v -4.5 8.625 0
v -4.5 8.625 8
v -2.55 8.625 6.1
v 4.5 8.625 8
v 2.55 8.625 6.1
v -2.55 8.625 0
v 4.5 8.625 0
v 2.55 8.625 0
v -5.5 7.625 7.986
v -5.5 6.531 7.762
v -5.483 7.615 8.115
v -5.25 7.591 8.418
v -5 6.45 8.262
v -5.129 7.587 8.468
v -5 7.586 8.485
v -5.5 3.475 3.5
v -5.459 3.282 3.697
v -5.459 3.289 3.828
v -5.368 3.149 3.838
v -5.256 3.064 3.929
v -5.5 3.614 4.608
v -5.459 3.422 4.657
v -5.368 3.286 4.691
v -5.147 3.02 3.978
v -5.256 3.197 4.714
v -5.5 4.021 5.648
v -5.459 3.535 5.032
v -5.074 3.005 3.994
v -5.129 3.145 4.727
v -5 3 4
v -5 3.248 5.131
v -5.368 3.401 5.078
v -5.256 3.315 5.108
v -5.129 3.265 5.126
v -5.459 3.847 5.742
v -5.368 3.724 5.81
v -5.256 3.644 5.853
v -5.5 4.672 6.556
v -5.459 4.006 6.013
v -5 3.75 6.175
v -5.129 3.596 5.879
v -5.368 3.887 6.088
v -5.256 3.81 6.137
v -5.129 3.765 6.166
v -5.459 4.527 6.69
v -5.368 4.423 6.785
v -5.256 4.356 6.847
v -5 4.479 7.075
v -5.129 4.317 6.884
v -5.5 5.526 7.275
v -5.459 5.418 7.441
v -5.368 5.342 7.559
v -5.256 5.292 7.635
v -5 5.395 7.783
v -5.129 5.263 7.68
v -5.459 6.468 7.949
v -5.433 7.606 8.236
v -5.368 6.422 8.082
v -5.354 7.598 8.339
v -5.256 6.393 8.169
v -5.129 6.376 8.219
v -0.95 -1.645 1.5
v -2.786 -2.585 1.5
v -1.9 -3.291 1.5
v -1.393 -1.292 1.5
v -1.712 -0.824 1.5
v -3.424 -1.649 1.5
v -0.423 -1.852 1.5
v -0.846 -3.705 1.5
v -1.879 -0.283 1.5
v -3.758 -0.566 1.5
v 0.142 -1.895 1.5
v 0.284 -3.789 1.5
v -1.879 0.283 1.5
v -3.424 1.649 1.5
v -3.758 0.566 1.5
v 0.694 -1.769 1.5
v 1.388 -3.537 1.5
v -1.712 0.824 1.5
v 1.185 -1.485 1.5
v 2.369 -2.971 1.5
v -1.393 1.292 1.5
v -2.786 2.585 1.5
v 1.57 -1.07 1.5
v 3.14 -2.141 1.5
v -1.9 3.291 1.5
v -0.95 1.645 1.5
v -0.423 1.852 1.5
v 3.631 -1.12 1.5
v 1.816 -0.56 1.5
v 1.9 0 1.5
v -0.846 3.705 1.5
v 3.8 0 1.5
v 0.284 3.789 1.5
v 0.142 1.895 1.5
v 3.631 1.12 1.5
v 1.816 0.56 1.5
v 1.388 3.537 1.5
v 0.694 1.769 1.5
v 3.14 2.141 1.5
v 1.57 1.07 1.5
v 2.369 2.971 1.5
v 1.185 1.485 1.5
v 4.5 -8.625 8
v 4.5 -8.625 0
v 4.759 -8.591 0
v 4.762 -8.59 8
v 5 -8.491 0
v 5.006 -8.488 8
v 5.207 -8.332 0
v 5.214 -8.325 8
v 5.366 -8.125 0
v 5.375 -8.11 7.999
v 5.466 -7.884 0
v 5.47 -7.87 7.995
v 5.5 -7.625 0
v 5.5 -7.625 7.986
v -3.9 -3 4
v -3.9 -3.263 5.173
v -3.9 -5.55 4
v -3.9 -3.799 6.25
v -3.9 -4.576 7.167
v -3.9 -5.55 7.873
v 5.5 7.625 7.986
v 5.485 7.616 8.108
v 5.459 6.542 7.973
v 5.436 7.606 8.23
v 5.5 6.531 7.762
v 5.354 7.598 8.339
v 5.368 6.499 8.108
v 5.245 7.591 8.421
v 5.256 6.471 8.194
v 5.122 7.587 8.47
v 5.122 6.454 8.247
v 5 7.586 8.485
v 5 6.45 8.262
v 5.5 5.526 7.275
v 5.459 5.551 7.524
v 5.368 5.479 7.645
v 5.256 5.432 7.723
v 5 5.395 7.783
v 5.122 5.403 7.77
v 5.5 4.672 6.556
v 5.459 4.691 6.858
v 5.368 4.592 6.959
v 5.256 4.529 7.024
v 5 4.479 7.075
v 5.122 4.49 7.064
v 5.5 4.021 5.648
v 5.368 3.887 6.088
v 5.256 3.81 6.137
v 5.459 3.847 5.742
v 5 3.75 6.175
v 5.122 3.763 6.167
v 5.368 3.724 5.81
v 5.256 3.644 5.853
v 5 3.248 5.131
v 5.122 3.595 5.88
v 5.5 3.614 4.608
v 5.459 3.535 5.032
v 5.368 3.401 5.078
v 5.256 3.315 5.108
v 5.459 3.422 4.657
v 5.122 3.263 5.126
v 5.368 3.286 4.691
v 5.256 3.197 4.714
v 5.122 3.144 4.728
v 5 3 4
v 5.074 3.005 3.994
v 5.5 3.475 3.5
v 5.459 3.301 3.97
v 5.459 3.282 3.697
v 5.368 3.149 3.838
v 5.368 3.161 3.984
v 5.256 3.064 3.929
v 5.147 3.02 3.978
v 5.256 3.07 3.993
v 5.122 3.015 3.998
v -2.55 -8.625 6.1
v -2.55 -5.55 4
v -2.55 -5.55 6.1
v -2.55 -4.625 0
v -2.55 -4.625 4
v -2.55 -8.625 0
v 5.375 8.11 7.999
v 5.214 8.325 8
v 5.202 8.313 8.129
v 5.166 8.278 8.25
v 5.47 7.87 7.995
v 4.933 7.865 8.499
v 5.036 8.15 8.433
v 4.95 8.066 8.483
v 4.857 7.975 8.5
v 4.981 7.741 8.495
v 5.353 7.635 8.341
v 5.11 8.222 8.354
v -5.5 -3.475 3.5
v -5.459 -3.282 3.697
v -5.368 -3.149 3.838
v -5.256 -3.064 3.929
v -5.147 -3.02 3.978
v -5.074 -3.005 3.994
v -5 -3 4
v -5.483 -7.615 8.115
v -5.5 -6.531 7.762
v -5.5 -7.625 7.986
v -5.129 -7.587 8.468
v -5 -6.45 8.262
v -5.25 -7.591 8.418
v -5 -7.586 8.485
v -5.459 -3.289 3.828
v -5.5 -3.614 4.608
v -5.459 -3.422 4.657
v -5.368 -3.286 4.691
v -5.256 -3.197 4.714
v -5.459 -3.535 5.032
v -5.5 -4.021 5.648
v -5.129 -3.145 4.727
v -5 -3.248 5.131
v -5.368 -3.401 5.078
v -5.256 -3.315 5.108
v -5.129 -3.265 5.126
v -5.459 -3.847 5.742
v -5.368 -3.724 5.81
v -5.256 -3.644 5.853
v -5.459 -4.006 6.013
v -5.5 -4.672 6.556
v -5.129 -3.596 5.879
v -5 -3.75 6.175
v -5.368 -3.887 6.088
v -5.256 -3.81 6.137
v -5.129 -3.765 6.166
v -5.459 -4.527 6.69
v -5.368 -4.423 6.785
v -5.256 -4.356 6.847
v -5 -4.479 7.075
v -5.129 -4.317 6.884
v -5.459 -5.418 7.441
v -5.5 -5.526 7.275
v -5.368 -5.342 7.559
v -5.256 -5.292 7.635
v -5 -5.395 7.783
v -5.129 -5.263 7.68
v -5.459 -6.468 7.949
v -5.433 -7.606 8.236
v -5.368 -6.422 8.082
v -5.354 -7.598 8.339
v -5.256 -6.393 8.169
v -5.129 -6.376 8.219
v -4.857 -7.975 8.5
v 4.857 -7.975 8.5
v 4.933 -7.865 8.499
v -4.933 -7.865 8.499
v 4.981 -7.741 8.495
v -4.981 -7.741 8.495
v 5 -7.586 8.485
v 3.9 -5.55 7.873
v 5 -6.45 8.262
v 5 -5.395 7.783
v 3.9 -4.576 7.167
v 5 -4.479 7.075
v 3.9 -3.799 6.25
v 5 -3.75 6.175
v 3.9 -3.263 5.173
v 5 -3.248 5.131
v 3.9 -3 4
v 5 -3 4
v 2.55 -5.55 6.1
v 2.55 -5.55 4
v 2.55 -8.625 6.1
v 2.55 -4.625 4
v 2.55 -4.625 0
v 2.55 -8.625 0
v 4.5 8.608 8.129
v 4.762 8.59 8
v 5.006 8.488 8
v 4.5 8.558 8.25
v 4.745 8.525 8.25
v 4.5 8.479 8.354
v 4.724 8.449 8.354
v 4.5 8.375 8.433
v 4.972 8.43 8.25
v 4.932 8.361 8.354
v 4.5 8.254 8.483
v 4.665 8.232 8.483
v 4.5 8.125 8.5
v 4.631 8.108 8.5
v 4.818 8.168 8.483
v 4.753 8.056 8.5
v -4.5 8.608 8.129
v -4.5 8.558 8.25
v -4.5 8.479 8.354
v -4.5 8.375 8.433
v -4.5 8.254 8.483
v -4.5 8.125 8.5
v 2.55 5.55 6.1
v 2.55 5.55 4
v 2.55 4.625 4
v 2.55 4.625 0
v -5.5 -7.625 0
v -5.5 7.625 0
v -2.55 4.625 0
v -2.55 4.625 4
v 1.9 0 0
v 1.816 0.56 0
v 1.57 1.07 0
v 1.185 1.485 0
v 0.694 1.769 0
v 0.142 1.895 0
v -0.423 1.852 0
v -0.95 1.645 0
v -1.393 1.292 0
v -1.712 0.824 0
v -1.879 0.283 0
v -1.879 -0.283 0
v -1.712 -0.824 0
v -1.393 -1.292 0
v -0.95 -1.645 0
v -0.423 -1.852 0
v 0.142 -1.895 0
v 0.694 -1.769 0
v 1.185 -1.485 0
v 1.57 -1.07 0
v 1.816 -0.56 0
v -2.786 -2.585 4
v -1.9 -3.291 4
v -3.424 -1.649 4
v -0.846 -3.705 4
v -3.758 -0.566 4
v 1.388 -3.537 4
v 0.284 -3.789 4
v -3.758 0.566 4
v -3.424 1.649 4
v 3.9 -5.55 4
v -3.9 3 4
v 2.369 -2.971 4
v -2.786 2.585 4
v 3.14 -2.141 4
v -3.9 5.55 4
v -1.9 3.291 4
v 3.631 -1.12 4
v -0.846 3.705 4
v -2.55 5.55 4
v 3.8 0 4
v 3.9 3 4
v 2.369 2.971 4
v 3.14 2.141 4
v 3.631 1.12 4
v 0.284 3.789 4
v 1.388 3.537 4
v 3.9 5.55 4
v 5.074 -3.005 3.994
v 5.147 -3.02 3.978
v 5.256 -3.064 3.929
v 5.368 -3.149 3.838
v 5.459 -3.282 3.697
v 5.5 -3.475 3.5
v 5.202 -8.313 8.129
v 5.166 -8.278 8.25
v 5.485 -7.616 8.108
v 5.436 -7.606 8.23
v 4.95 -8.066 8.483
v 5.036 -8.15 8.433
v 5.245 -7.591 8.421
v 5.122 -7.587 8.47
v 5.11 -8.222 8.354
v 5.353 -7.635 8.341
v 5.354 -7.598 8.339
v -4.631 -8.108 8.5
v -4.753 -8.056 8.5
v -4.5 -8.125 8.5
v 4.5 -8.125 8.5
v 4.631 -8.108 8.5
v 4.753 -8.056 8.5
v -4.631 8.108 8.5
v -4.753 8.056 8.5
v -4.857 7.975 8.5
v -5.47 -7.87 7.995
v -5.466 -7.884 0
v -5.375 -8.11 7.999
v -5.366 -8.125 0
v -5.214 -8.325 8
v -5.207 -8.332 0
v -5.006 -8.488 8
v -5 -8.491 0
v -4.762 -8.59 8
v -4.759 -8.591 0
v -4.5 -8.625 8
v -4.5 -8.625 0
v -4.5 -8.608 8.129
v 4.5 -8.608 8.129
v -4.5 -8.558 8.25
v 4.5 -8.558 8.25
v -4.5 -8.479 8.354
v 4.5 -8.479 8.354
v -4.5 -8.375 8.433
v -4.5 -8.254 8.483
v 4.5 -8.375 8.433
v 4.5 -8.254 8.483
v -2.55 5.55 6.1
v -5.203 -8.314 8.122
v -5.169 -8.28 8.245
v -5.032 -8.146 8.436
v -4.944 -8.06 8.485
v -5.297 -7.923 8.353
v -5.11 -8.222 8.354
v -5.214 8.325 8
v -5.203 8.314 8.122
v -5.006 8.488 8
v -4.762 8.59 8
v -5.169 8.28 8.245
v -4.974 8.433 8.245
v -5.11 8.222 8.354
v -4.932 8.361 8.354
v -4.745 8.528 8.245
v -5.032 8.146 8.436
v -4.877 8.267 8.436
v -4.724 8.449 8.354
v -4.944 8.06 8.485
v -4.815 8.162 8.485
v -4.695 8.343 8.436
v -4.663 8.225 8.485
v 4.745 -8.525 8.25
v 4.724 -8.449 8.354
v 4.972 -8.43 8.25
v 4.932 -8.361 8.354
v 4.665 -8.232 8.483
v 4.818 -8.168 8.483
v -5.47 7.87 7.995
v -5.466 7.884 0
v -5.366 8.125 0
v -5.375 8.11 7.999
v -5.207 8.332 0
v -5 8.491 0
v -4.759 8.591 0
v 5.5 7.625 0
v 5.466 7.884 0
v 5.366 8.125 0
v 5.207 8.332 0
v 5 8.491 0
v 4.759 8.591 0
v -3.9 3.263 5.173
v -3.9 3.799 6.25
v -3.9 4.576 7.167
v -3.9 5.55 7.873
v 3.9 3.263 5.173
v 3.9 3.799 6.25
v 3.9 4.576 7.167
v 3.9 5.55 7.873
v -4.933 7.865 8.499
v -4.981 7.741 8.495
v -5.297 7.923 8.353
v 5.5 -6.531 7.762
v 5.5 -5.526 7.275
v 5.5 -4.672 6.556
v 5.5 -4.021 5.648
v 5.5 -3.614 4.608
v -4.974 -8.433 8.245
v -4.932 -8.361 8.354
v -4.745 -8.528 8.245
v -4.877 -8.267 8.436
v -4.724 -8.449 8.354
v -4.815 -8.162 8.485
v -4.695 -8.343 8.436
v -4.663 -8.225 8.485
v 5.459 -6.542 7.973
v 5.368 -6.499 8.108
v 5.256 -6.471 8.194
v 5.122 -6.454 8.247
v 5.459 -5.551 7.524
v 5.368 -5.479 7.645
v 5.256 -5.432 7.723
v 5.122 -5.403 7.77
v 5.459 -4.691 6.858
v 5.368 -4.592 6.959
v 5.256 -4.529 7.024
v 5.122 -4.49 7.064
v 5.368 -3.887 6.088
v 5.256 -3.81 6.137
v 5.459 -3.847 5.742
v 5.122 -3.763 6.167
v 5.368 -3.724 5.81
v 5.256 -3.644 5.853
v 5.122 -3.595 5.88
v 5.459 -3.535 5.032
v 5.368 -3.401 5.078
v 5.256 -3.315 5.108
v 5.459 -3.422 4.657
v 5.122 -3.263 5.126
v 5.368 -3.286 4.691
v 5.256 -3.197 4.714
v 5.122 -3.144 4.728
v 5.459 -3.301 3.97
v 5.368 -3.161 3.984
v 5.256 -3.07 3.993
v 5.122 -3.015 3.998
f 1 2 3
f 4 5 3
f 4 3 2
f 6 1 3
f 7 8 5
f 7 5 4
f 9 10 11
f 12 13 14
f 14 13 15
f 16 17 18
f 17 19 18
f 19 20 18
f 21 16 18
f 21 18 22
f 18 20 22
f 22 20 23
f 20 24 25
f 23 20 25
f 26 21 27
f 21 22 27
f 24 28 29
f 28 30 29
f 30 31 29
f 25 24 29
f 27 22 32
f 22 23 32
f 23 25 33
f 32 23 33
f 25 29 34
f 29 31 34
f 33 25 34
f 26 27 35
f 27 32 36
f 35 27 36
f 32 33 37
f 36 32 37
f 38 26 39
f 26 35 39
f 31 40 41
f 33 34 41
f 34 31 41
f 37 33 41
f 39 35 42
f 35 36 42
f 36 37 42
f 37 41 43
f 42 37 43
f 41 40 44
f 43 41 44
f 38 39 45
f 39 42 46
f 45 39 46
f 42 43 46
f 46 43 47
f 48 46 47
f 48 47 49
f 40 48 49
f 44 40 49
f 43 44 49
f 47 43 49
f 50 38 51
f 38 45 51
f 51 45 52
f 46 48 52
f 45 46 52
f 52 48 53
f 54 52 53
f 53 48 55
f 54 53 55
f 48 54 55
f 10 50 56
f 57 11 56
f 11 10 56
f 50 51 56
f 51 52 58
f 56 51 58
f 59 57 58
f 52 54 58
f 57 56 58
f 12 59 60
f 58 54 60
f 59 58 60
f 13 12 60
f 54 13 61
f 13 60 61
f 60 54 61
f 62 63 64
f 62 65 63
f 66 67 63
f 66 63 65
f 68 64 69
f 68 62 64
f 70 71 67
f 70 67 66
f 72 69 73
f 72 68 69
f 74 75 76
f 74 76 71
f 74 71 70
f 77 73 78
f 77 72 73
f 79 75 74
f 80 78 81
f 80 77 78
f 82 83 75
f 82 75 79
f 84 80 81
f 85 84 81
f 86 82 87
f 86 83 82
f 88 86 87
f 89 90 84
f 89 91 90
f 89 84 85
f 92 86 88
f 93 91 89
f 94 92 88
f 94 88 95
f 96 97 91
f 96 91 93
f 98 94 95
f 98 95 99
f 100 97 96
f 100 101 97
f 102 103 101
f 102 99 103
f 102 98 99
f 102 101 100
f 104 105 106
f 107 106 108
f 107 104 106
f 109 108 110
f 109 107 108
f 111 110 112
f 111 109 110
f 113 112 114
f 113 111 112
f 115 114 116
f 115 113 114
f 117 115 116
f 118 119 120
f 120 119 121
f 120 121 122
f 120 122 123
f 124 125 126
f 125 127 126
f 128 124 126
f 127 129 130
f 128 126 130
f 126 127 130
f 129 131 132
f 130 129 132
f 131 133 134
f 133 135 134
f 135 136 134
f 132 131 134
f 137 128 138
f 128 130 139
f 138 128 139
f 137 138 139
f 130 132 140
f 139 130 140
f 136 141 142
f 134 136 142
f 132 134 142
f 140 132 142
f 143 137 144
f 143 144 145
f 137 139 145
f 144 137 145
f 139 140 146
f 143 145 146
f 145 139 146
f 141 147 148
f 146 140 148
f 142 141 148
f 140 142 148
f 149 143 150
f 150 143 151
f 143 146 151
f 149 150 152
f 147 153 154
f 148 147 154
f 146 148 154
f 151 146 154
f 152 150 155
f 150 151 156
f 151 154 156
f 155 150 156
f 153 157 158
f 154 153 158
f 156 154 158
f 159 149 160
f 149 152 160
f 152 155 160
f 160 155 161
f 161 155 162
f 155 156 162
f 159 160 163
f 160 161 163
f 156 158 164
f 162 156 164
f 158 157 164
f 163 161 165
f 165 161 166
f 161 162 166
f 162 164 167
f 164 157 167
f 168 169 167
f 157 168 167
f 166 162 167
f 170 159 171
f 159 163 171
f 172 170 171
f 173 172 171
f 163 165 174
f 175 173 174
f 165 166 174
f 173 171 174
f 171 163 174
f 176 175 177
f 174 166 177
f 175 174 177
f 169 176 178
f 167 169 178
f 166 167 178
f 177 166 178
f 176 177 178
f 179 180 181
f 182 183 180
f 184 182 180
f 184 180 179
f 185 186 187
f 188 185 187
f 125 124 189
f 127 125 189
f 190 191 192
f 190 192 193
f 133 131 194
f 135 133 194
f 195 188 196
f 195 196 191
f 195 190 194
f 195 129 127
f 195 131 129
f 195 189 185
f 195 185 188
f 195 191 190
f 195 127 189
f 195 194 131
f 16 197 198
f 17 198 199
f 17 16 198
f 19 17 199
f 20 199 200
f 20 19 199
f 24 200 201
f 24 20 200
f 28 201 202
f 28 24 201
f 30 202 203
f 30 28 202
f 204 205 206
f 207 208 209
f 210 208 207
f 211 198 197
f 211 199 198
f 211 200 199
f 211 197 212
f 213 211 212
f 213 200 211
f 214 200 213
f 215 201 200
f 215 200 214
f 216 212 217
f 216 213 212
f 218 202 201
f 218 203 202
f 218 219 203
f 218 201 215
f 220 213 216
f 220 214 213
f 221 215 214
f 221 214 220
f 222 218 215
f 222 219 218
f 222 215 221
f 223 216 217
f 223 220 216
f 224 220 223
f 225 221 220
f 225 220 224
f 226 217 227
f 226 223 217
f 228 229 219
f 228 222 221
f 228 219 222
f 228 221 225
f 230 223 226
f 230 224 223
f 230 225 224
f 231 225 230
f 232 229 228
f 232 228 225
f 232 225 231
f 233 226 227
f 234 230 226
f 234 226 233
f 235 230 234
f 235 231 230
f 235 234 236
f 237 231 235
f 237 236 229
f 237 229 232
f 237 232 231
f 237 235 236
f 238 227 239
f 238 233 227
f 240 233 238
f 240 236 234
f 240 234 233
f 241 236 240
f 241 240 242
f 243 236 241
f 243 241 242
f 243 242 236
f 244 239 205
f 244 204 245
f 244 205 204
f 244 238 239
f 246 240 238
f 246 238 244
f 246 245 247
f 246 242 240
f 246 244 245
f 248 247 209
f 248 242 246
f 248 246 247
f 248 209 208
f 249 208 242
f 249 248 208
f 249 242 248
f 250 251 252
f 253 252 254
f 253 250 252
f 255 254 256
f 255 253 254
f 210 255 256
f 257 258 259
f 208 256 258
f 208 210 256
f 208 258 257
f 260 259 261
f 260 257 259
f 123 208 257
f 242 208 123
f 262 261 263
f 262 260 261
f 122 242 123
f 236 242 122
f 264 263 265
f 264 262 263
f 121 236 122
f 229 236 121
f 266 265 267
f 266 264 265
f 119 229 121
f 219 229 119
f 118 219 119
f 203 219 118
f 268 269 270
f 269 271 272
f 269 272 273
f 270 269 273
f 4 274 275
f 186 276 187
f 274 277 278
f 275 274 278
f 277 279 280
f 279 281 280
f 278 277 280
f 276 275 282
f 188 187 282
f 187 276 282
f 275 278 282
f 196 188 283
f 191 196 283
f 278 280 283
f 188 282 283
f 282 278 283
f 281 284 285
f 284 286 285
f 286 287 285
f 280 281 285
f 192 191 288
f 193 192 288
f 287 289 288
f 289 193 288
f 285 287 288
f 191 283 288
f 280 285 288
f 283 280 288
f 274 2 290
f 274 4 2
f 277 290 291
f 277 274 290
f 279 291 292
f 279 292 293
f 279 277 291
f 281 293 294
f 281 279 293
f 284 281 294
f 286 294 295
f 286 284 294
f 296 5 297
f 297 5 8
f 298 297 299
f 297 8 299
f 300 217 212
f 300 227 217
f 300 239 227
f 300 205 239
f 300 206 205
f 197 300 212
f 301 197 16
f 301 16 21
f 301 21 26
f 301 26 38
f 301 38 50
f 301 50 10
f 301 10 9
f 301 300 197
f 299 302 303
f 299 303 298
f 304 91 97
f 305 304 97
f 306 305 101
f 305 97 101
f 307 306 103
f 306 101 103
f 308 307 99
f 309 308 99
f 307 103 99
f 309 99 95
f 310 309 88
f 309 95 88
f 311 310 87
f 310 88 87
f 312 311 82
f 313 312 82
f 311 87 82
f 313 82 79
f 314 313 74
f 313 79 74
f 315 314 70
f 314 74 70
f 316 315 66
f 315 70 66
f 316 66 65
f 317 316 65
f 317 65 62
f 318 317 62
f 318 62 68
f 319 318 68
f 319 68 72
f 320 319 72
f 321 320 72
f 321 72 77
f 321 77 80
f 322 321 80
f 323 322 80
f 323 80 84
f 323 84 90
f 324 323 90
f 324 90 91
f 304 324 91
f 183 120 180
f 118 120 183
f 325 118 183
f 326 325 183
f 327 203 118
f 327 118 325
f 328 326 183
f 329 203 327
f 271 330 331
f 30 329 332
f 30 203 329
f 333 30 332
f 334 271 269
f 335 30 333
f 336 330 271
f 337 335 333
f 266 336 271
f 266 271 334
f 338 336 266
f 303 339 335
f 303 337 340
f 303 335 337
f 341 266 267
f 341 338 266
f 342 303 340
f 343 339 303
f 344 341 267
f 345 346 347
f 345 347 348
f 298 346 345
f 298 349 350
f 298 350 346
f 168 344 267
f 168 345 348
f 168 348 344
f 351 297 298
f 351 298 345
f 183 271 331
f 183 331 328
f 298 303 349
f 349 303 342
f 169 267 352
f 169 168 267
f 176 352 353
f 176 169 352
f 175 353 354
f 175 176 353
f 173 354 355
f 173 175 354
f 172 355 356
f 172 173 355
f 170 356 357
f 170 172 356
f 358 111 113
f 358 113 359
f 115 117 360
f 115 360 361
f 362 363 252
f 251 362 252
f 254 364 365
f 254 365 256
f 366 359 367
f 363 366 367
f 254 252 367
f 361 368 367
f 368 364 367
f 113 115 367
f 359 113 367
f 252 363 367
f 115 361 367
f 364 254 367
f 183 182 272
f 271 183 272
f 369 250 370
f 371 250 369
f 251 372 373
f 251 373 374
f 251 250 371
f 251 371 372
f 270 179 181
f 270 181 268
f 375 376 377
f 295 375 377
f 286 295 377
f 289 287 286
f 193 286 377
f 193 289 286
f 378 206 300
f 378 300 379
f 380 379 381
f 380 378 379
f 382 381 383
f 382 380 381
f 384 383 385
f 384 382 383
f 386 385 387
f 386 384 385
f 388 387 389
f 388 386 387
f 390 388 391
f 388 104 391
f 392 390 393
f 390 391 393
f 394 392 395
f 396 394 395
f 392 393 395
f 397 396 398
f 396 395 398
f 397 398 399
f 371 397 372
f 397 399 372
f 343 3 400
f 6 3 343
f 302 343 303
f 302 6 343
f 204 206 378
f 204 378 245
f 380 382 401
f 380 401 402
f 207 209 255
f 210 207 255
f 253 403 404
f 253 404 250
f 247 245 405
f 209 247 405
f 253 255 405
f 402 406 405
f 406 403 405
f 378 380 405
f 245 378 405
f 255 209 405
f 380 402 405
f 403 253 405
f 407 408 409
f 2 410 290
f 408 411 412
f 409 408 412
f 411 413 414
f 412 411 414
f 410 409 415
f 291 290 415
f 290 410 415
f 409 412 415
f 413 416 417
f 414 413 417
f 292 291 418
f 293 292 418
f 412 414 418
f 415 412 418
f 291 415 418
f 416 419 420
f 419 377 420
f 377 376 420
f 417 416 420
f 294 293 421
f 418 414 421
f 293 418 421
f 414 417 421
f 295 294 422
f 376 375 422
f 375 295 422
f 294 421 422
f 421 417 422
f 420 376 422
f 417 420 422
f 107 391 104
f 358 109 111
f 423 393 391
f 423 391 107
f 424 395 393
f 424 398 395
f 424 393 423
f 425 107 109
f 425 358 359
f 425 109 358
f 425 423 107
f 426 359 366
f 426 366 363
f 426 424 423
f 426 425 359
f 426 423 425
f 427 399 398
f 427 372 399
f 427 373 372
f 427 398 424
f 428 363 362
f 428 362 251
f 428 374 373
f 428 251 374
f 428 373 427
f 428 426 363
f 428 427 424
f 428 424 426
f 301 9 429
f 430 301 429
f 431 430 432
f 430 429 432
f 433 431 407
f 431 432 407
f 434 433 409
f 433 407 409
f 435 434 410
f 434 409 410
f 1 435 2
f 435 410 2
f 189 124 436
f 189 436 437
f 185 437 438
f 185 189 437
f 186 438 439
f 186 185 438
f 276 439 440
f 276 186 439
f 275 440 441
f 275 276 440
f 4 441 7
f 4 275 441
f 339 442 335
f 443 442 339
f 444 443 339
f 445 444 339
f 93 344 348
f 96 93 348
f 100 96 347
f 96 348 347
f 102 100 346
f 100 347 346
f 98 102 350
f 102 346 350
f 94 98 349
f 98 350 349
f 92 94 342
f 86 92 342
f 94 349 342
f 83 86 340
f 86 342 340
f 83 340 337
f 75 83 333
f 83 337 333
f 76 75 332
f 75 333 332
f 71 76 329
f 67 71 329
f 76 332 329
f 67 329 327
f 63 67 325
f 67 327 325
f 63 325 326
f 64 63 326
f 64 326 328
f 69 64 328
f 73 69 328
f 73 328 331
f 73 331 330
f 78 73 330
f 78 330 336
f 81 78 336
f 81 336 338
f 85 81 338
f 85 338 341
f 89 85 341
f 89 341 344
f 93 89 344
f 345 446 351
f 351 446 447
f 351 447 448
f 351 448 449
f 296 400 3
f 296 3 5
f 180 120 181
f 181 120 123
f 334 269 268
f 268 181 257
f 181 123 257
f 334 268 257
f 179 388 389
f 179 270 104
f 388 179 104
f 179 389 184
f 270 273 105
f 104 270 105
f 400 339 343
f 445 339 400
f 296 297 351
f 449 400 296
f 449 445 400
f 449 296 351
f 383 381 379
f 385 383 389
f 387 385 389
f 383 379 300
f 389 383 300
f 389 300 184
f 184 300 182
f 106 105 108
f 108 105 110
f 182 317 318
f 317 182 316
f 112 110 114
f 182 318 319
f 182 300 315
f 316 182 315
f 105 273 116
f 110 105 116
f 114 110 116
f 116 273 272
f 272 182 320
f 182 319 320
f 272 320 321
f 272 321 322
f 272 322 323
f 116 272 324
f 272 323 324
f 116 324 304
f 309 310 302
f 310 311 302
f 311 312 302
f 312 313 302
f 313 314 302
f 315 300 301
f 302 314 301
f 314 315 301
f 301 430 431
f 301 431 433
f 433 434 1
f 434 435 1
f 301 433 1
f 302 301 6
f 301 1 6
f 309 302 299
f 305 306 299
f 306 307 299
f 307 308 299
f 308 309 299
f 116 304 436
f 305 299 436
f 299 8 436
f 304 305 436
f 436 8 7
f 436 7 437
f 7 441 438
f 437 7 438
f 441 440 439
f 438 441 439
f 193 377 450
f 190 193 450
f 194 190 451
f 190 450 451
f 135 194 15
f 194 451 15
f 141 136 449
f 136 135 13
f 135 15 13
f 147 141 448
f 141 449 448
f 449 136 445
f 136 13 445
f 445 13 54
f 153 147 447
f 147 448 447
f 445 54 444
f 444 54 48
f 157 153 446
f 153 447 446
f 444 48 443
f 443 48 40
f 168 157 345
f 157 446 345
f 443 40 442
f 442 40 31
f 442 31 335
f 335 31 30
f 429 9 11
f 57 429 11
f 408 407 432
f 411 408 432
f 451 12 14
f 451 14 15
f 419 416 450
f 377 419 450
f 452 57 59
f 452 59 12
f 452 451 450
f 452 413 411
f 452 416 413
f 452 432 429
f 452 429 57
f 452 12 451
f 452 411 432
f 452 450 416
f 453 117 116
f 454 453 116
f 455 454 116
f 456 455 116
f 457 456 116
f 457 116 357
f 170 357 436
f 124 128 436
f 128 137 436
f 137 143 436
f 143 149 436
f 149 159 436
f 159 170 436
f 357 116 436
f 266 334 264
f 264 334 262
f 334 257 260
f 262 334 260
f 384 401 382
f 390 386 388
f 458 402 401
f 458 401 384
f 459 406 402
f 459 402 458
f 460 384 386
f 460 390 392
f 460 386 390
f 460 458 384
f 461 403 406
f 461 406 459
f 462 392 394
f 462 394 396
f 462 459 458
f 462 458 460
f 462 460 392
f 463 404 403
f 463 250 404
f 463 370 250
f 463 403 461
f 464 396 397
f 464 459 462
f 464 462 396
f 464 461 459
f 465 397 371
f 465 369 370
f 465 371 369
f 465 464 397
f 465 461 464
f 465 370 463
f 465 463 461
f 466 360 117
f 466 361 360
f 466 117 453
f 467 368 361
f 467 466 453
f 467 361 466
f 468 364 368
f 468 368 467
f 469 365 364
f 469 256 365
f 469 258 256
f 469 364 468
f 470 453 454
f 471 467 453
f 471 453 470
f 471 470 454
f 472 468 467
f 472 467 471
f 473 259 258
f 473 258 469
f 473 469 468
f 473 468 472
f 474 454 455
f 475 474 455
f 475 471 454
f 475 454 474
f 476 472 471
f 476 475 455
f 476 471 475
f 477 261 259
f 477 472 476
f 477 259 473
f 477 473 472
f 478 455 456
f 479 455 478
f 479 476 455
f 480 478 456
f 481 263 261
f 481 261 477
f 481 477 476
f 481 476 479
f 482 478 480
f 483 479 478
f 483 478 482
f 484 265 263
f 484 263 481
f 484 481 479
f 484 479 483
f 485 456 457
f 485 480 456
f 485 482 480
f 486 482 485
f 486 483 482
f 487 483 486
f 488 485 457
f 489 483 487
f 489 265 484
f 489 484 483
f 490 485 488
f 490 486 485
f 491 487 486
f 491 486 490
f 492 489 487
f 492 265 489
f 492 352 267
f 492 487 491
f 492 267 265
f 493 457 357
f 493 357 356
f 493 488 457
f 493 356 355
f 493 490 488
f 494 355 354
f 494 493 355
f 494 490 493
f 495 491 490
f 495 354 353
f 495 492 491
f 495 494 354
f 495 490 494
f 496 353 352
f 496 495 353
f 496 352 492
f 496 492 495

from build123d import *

# Parameters (mm, degrees)
F0_W         = 11
F0_H         = 17.25
F1_DEPTH     = 8.5
F2_W         = 7.8
F2_H         = 2.55
F2_H_2       = 6
F2_W_2       = 1.6
F3_DEPTH     = 4.5
F4_W         = 5.1
F4_H         = 4
F5_DEPTH     = 6.1
F6_R         = 3.8
F7_DEPTH     = 2.5
F8_R         = 1.9
F9_DEPTH     = 1.501
F10_T1_DEPTH = 26.4746859277
F11_R        = 1
F12_R        = 0.5


# Not quite as in the source:
# - a fillet or chamfer that OpenCascade refuses, or shapes differently, is made with other operations: its cross-section is extruded or revolved along the edge and cut away or added


with BuildPart() as f1:
    # F0 (on Top) → F1 (new body)
    with BuildSketch(Plane.XY):
        Rectangle(F0_W, F0_H)
    extrude(amount=F1_DEPTH)

    # F2 (on face) → F3 (cut)
    with BuildSketch(Plane.XY.offset(8.5)):
        with Locations((0, -4.275)):
            Rectangle(F2_W, F2_H)
        Rectangle(F2_W, F2_H_2)
        with Locations((4.7, 0)):
            Rectangle(F2_W_2, F2_H_2)
        with Locations((-4.7, 0)):
            Rectangle(F2_W_2, F2_H_2)
        with Locations((0, 4.275)):
            Rectangle(F2_W, F2_H)
    extrude(amount=-F3_DEPTH, mode=Mode.SUBTRACT)

    # F4 (on face) → F5 (cut)
    with BuildSketch(Plane(origin=(0, 0, 0), x_dir=(1, 0, 0), z_dir=(0, 0, -1))):
        with Locations((0, -6.625)):
            Rectangle(F4_W, F4_H)
        with Locations((0, 6.625)):
            Rectangle(F4_W, F4_H)
    extrude(amount=-F5_DEPTH, mode=Mode.SUBTRACT)

    # F6 (on face) → F7 (cut)
    with BuildSketch(Plane.XY.offset(4)):
        Circle(F6_R)
    extrude(amount=-F7_DEPTH, mode=Mode.SUBTRACT)

    # F8 (on face) → F9 (cut, through all)
    with BuildSketch(Plane.XY.offset(1.5)):
        Circle(F8_R)
    extrude(amount=-F9_DEPTH, mode=Mode.SUBTRACT)

    # F10: fillet of radius 5 on 2 edges, made by hand

    # F10_s2 → F10_t1 (cut)
    with BuildSketch(Plane.YZ.offset(-17.9373429638)):
        with BuildLine():
            ThreePointArc((-7.9749371855, 8.5), (-4.6208352193, 7.2080992435), (-3, 4))
            Line((-3, 4), (-3, 8.5))
            Line((-3, 8.5), (-7.9749371855, 8.5))
        make_face()
        with BuildLine():
            ThreePointArc((7.9749371855, 8.5), (4.6208352193, 7.2080992435), (3, 4))
            Line((3, 4), (3, 8.5))
            Line((3, 8.5), (7.9749371855, 8.5))
        make_face()
    extrude(amount=F10_T1_DEPTH, mode=Mode.SUBTRACT)

    # F11
    f11_edges = [f1.edges().sort_by_distance(p)[0] for p in [
        (5.5, -8.625, 4.25),
        (-5.5, -8.625, 4.25),
        (5.5, 8.625, 4.25),
        (-5.5, 8.625, 4.25),
    ]]
    fillet(f11_edges, radius=F11_R)

    # F12
    f12_edges = [f1.edges().sort_by_distance(p)[0] for p in [
        (0, 8.625, 8.5),
        (0, -8.625, 8.5),
        (-5.5, 0, 4),
        (5.5, 0, 4),
        (5.5, -4.493052, 7.088381),
        (5.5, 4.493052, 7.088381),
        (5.483858, -7.803952, 8.497076),
        (5.070115, -8.446565, 8.5),
        (5.483858, 7.803952, 8.497076),
        (5.070115, 8.446565, 8.5),
        (-5.5, -4.493052, 7.088381),
        (-5.483858, -7.803951, 8.497076),
        (-5.5, 4.493052, 7.088381),
        (-5.483858, 7.803952, 8.497076),
        (-5.070115, -8.446565, 8.5),
        (-5.070115, 8.446565, 8.5),
    ]]
    fillet(f12_edges, radius=F12_R)


solid = f1.part
